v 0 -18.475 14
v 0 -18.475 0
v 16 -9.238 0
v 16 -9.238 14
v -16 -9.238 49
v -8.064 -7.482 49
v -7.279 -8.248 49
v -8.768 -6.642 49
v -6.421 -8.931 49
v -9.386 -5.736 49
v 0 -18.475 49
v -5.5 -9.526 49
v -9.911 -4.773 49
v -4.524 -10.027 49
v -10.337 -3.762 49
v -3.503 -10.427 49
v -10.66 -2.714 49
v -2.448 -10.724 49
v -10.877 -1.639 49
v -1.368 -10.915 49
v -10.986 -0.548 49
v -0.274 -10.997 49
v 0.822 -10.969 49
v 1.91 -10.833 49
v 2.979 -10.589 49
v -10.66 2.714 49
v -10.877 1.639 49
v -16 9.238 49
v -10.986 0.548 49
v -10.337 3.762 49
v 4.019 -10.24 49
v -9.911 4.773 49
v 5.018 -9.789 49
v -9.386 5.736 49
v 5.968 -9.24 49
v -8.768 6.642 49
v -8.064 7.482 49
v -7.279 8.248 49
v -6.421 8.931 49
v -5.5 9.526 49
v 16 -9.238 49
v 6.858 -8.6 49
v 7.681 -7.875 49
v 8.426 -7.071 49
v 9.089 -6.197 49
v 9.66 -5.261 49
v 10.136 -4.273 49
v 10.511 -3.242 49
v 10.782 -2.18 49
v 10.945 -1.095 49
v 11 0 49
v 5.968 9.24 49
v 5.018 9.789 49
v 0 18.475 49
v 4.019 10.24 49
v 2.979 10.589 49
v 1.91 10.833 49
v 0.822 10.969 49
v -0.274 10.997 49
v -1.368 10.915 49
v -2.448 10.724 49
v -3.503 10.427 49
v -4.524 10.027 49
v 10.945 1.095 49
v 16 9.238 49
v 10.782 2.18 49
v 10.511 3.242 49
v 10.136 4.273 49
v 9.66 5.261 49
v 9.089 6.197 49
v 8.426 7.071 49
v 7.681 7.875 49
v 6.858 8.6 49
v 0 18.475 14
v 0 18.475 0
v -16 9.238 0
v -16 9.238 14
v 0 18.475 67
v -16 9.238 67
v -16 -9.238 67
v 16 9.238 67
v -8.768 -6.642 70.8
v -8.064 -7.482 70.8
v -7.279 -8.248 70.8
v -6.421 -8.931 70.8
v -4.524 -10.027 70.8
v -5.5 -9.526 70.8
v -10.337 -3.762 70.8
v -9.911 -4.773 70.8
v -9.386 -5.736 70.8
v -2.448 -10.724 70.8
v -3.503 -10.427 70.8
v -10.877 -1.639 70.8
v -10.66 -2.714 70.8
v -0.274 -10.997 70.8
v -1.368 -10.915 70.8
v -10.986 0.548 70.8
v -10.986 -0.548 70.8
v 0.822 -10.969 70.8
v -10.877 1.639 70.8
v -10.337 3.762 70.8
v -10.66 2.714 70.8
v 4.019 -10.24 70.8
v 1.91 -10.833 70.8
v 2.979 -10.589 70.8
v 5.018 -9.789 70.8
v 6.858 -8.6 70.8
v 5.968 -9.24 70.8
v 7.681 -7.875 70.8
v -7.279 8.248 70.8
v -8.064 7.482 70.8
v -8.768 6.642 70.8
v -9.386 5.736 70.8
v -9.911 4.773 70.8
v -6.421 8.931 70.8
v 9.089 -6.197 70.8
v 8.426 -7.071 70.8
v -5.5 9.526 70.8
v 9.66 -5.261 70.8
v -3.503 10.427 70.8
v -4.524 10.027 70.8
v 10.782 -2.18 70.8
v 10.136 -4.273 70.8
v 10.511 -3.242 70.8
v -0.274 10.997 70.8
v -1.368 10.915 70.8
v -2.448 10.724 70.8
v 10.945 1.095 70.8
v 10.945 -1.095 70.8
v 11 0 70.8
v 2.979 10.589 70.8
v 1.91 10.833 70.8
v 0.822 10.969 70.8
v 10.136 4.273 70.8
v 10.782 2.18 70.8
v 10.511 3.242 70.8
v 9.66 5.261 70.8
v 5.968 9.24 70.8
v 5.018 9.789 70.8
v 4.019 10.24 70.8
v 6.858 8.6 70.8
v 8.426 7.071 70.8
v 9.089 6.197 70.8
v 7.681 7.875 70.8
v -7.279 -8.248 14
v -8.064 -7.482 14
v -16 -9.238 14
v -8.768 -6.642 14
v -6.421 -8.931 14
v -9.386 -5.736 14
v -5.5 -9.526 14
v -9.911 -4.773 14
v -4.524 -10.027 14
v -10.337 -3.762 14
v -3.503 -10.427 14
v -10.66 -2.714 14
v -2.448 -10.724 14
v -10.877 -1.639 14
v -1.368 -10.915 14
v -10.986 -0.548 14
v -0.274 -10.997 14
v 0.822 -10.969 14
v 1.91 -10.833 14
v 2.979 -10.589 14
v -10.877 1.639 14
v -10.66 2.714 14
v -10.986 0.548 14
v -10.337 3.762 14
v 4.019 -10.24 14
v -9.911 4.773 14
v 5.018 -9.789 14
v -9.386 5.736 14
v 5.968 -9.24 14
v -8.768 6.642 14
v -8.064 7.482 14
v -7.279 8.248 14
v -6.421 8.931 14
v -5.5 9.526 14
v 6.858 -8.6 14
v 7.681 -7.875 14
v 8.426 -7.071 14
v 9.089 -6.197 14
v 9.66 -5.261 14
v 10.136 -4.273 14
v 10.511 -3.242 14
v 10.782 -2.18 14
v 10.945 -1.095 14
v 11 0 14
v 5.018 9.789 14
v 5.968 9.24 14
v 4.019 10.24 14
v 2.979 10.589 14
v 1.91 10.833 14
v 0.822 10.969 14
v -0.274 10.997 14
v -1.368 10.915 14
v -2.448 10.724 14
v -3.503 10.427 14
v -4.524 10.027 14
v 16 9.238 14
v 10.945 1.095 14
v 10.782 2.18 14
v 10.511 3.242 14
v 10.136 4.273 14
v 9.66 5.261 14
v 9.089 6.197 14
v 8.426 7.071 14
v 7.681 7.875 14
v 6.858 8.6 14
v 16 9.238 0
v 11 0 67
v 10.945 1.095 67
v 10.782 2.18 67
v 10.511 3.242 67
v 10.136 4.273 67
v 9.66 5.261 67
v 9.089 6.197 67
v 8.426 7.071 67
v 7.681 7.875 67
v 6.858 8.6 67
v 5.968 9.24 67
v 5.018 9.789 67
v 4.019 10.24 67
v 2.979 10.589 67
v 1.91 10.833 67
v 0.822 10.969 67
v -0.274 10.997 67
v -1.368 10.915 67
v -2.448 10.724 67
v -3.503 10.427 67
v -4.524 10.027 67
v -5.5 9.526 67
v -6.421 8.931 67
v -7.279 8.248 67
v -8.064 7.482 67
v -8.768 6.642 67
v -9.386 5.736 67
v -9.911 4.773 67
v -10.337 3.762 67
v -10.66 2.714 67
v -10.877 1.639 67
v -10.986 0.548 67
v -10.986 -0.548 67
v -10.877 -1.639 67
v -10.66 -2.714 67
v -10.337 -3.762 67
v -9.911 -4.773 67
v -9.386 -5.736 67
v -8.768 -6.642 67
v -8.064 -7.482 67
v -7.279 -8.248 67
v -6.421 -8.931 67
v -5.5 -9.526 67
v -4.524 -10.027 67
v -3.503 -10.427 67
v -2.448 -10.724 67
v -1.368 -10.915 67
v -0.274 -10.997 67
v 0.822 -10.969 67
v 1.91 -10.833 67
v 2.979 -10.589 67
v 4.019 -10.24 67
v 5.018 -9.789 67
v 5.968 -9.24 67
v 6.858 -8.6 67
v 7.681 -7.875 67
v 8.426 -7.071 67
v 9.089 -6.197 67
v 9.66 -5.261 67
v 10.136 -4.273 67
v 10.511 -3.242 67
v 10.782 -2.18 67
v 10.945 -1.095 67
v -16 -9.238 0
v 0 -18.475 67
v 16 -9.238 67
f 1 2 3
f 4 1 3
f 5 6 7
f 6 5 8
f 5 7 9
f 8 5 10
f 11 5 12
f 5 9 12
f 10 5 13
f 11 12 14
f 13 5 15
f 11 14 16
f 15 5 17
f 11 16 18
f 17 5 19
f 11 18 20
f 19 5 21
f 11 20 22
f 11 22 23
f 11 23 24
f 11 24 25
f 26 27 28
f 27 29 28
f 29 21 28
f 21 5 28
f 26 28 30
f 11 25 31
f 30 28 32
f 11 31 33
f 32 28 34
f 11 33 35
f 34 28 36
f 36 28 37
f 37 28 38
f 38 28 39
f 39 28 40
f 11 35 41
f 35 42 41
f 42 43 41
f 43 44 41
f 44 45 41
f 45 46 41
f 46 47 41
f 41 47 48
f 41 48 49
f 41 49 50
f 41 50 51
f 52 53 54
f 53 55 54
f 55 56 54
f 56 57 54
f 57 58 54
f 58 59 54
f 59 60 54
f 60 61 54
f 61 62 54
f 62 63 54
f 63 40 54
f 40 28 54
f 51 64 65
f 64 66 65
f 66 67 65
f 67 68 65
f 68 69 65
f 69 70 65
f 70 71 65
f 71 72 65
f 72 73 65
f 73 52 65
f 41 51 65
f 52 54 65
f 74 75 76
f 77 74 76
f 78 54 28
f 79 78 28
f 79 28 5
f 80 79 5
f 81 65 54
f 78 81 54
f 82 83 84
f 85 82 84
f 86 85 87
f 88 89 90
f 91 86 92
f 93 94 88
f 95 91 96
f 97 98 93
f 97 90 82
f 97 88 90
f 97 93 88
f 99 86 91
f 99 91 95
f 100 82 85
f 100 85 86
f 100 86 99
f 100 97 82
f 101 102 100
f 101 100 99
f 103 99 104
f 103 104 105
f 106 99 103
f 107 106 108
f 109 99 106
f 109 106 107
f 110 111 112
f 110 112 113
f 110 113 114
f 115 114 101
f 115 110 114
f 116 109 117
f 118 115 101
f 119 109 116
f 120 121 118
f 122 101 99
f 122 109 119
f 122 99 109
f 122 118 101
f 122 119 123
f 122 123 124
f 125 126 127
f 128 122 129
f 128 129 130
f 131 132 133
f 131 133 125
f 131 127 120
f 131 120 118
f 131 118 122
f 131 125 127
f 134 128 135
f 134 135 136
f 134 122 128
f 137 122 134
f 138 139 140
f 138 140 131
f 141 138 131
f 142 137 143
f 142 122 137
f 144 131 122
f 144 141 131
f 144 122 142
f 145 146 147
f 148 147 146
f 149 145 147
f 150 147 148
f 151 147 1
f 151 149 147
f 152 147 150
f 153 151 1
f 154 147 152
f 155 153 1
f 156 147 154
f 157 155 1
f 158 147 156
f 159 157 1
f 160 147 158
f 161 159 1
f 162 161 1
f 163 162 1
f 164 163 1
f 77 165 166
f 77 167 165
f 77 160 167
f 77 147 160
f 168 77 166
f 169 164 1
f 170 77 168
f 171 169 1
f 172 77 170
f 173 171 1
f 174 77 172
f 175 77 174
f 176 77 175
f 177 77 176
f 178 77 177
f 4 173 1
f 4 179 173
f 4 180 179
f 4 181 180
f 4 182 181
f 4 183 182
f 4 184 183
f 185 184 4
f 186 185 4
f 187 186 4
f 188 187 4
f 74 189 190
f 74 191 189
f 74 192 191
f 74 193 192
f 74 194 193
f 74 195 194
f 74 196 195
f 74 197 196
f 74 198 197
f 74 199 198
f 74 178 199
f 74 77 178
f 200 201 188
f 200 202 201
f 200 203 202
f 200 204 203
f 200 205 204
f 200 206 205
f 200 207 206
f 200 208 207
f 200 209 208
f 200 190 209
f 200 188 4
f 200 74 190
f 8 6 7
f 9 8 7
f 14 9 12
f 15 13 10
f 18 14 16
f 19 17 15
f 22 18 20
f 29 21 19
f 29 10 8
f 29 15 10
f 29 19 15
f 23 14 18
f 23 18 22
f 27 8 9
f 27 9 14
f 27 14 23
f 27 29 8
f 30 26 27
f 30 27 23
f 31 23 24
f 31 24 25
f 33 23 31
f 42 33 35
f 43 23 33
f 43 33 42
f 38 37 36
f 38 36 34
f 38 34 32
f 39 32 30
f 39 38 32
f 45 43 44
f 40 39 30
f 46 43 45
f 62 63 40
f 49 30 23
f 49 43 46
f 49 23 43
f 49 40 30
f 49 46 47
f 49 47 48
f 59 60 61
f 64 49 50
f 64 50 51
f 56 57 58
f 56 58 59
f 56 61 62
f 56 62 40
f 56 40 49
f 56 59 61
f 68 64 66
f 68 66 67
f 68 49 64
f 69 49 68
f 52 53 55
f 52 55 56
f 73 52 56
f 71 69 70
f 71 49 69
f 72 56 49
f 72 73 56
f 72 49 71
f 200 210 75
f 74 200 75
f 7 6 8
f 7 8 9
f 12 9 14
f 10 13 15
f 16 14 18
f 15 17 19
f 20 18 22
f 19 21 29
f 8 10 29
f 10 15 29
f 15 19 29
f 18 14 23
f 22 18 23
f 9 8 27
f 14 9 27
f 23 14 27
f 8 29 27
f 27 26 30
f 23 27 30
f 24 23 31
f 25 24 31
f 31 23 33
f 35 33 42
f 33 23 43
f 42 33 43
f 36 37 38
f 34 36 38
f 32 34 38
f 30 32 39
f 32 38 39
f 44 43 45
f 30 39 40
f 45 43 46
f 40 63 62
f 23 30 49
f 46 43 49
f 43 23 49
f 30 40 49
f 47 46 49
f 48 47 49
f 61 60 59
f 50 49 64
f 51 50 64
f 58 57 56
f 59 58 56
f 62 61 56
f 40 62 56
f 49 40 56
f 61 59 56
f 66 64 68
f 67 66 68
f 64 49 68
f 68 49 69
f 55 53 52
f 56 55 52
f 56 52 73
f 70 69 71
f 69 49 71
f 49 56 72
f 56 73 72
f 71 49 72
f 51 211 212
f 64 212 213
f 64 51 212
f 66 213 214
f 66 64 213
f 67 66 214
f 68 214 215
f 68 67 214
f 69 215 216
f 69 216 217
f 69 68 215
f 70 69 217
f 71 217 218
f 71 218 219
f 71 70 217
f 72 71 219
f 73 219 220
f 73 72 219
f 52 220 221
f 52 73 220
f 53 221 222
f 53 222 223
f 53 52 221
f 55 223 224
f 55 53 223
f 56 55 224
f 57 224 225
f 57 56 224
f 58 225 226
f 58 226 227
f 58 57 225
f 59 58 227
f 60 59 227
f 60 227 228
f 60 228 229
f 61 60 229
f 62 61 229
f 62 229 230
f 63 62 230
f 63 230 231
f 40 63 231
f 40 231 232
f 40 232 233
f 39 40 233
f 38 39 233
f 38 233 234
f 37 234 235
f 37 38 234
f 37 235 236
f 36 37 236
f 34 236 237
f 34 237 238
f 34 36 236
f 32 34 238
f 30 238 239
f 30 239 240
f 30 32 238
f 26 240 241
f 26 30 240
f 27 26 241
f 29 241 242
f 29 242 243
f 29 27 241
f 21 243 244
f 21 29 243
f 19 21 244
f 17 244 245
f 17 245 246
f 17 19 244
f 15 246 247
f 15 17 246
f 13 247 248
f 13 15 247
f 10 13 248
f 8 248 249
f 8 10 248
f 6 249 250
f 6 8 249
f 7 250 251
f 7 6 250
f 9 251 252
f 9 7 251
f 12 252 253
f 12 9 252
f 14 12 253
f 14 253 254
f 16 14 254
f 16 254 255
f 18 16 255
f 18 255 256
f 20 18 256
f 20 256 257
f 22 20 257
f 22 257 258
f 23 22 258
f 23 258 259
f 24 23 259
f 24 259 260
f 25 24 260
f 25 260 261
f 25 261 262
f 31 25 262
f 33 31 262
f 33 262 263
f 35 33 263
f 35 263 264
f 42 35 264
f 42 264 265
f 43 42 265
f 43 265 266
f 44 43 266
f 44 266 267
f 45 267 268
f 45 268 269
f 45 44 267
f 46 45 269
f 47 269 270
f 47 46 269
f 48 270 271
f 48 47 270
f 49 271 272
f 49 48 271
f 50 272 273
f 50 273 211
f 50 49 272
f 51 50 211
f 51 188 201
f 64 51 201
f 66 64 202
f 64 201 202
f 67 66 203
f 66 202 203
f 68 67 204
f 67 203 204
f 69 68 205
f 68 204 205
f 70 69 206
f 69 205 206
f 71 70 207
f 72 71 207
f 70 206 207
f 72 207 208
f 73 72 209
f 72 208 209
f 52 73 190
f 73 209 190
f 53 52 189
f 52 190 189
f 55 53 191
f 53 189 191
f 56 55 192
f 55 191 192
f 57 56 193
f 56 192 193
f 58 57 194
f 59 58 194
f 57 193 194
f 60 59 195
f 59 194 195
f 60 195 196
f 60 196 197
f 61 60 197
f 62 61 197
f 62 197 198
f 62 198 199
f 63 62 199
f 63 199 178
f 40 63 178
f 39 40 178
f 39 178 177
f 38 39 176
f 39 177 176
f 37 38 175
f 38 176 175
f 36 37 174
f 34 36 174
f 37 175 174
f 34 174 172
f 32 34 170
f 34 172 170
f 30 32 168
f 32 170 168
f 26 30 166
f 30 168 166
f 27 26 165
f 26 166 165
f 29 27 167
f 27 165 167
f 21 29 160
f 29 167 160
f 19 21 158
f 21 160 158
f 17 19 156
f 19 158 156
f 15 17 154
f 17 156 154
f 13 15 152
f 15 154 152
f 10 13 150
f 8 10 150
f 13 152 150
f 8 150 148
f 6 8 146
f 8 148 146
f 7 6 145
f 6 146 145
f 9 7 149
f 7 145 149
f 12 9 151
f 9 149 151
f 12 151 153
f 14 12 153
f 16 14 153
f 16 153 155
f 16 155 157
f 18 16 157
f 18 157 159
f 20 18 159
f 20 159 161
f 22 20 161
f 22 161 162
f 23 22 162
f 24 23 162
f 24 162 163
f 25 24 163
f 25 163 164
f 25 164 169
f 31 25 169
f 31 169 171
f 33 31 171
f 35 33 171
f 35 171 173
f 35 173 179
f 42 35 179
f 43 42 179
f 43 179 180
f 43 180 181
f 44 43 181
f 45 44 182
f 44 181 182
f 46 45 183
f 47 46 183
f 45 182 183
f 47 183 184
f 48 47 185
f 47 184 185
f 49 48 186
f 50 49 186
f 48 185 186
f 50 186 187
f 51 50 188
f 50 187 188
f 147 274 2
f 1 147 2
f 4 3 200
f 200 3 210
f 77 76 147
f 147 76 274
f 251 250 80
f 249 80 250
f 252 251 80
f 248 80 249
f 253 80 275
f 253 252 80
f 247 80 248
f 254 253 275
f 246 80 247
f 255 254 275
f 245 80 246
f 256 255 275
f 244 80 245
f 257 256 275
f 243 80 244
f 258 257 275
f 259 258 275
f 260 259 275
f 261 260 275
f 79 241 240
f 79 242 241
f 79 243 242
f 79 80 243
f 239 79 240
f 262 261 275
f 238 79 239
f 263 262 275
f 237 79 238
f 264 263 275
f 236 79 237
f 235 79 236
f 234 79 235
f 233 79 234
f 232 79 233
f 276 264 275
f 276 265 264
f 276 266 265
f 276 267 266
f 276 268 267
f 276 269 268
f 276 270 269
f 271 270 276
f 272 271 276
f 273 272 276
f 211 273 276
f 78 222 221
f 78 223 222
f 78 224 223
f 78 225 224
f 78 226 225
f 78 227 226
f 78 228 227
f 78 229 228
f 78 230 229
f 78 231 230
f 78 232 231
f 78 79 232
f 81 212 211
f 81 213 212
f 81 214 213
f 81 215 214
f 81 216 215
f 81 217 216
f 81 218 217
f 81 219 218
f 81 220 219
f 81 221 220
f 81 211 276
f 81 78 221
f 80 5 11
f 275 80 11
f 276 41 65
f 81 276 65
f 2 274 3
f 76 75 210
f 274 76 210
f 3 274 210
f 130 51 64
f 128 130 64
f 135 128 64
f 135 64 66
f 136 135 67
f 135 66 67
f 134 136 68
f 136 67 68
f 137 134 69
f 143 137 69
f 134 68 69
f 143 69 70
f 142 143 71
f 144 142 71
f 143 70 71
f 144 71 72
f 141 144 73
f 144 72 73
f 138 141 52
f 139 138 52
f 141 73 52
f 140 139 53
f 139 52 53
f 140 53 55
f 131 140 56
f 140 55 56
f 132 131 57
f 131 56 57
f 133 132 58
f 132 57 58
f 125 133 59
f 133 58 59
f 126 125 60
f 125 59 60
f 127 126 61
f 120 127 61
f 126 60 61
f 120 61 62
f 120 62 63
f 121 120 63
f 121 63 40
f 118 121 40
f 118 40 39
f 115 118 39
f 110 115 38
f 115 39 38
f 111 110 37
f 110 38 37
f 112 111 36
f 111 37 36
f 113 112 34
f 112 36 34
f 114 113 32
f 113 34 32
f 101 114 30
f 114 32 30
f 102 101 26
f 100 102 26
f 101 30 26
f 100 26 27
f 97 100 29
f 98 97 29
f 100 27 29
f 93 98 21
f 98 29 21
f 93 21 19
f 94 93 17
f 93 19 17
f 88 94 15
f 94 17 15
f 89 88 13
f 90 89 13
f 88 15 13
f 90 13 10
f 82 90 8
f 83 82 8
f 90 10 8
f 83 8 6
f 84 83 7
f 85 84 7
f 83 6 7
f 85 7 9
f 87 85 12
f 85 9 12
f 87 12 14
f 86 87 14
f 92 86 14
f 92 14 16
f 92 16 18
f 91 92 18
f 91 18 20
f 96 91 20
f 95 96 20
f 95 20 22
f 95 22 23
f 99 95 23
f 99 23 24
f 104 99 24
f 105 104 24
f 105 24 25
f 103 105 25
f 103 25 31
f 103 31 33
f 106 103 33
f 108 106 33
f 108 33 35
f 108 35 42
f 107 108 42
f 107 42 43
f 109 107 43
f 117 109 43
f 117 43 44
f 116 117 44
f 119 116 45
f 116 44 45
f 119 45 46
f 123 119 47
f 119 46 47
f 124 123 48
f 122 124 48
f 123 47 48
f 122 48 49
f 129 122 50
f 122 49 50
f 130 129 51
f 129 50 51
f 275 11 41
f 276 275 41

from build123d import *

# Parameters (mm, degrees)
F1_DEPTH  = 14
F2_R      = 11
F3_DEPTH  = 35
F4_R      = 11
F5_DEPTH  = 18
F3_FACE_R = 11
F6_DEPTH  = 21.8


with BuildPart() as f1:
    # F0 (on Top) → F1 (new body)
    with BuildSketch(Plane.XY):
        Polygon((16, -9.237604), (16, 9.237604), (0, 18.475209), (-16, 9.237604), (-16, -9.237604), (0, -18.475209), align=None)
    extrude(amount=F1_DEPTH)

    # F2 (on face) → F3 (join)
    with BuildSketch(Plane.XY.offset(14)):
        Circle(F2_R)
    extrude(amount=F3_DEPTH)


with BuildPart() as f5:
    # F4 (on face) → F5 (new body)
    with BuildSketch(Plane.XY.offset(49)):
        Polygon((16, -9.237604), (16, 9.237604), (0, 18.475209), (-16, 9.237604), (-16, -9.237604), (0, -18.475209), align=None)
        Circle(F4_R, mode=Mode.SUBTRACT)
    extrude(amount=F5_DEPTH)


with BuildPart() as f6:
    # F3_face (on face) → F6 (new body)
    with BuildSketch(Plane.XY.offset(49)):
        Circle(F3_FACE_R)
    extrude(amount=F6_DEPTH)


solid = Compound([f1.part, f5.part, f6.part])
